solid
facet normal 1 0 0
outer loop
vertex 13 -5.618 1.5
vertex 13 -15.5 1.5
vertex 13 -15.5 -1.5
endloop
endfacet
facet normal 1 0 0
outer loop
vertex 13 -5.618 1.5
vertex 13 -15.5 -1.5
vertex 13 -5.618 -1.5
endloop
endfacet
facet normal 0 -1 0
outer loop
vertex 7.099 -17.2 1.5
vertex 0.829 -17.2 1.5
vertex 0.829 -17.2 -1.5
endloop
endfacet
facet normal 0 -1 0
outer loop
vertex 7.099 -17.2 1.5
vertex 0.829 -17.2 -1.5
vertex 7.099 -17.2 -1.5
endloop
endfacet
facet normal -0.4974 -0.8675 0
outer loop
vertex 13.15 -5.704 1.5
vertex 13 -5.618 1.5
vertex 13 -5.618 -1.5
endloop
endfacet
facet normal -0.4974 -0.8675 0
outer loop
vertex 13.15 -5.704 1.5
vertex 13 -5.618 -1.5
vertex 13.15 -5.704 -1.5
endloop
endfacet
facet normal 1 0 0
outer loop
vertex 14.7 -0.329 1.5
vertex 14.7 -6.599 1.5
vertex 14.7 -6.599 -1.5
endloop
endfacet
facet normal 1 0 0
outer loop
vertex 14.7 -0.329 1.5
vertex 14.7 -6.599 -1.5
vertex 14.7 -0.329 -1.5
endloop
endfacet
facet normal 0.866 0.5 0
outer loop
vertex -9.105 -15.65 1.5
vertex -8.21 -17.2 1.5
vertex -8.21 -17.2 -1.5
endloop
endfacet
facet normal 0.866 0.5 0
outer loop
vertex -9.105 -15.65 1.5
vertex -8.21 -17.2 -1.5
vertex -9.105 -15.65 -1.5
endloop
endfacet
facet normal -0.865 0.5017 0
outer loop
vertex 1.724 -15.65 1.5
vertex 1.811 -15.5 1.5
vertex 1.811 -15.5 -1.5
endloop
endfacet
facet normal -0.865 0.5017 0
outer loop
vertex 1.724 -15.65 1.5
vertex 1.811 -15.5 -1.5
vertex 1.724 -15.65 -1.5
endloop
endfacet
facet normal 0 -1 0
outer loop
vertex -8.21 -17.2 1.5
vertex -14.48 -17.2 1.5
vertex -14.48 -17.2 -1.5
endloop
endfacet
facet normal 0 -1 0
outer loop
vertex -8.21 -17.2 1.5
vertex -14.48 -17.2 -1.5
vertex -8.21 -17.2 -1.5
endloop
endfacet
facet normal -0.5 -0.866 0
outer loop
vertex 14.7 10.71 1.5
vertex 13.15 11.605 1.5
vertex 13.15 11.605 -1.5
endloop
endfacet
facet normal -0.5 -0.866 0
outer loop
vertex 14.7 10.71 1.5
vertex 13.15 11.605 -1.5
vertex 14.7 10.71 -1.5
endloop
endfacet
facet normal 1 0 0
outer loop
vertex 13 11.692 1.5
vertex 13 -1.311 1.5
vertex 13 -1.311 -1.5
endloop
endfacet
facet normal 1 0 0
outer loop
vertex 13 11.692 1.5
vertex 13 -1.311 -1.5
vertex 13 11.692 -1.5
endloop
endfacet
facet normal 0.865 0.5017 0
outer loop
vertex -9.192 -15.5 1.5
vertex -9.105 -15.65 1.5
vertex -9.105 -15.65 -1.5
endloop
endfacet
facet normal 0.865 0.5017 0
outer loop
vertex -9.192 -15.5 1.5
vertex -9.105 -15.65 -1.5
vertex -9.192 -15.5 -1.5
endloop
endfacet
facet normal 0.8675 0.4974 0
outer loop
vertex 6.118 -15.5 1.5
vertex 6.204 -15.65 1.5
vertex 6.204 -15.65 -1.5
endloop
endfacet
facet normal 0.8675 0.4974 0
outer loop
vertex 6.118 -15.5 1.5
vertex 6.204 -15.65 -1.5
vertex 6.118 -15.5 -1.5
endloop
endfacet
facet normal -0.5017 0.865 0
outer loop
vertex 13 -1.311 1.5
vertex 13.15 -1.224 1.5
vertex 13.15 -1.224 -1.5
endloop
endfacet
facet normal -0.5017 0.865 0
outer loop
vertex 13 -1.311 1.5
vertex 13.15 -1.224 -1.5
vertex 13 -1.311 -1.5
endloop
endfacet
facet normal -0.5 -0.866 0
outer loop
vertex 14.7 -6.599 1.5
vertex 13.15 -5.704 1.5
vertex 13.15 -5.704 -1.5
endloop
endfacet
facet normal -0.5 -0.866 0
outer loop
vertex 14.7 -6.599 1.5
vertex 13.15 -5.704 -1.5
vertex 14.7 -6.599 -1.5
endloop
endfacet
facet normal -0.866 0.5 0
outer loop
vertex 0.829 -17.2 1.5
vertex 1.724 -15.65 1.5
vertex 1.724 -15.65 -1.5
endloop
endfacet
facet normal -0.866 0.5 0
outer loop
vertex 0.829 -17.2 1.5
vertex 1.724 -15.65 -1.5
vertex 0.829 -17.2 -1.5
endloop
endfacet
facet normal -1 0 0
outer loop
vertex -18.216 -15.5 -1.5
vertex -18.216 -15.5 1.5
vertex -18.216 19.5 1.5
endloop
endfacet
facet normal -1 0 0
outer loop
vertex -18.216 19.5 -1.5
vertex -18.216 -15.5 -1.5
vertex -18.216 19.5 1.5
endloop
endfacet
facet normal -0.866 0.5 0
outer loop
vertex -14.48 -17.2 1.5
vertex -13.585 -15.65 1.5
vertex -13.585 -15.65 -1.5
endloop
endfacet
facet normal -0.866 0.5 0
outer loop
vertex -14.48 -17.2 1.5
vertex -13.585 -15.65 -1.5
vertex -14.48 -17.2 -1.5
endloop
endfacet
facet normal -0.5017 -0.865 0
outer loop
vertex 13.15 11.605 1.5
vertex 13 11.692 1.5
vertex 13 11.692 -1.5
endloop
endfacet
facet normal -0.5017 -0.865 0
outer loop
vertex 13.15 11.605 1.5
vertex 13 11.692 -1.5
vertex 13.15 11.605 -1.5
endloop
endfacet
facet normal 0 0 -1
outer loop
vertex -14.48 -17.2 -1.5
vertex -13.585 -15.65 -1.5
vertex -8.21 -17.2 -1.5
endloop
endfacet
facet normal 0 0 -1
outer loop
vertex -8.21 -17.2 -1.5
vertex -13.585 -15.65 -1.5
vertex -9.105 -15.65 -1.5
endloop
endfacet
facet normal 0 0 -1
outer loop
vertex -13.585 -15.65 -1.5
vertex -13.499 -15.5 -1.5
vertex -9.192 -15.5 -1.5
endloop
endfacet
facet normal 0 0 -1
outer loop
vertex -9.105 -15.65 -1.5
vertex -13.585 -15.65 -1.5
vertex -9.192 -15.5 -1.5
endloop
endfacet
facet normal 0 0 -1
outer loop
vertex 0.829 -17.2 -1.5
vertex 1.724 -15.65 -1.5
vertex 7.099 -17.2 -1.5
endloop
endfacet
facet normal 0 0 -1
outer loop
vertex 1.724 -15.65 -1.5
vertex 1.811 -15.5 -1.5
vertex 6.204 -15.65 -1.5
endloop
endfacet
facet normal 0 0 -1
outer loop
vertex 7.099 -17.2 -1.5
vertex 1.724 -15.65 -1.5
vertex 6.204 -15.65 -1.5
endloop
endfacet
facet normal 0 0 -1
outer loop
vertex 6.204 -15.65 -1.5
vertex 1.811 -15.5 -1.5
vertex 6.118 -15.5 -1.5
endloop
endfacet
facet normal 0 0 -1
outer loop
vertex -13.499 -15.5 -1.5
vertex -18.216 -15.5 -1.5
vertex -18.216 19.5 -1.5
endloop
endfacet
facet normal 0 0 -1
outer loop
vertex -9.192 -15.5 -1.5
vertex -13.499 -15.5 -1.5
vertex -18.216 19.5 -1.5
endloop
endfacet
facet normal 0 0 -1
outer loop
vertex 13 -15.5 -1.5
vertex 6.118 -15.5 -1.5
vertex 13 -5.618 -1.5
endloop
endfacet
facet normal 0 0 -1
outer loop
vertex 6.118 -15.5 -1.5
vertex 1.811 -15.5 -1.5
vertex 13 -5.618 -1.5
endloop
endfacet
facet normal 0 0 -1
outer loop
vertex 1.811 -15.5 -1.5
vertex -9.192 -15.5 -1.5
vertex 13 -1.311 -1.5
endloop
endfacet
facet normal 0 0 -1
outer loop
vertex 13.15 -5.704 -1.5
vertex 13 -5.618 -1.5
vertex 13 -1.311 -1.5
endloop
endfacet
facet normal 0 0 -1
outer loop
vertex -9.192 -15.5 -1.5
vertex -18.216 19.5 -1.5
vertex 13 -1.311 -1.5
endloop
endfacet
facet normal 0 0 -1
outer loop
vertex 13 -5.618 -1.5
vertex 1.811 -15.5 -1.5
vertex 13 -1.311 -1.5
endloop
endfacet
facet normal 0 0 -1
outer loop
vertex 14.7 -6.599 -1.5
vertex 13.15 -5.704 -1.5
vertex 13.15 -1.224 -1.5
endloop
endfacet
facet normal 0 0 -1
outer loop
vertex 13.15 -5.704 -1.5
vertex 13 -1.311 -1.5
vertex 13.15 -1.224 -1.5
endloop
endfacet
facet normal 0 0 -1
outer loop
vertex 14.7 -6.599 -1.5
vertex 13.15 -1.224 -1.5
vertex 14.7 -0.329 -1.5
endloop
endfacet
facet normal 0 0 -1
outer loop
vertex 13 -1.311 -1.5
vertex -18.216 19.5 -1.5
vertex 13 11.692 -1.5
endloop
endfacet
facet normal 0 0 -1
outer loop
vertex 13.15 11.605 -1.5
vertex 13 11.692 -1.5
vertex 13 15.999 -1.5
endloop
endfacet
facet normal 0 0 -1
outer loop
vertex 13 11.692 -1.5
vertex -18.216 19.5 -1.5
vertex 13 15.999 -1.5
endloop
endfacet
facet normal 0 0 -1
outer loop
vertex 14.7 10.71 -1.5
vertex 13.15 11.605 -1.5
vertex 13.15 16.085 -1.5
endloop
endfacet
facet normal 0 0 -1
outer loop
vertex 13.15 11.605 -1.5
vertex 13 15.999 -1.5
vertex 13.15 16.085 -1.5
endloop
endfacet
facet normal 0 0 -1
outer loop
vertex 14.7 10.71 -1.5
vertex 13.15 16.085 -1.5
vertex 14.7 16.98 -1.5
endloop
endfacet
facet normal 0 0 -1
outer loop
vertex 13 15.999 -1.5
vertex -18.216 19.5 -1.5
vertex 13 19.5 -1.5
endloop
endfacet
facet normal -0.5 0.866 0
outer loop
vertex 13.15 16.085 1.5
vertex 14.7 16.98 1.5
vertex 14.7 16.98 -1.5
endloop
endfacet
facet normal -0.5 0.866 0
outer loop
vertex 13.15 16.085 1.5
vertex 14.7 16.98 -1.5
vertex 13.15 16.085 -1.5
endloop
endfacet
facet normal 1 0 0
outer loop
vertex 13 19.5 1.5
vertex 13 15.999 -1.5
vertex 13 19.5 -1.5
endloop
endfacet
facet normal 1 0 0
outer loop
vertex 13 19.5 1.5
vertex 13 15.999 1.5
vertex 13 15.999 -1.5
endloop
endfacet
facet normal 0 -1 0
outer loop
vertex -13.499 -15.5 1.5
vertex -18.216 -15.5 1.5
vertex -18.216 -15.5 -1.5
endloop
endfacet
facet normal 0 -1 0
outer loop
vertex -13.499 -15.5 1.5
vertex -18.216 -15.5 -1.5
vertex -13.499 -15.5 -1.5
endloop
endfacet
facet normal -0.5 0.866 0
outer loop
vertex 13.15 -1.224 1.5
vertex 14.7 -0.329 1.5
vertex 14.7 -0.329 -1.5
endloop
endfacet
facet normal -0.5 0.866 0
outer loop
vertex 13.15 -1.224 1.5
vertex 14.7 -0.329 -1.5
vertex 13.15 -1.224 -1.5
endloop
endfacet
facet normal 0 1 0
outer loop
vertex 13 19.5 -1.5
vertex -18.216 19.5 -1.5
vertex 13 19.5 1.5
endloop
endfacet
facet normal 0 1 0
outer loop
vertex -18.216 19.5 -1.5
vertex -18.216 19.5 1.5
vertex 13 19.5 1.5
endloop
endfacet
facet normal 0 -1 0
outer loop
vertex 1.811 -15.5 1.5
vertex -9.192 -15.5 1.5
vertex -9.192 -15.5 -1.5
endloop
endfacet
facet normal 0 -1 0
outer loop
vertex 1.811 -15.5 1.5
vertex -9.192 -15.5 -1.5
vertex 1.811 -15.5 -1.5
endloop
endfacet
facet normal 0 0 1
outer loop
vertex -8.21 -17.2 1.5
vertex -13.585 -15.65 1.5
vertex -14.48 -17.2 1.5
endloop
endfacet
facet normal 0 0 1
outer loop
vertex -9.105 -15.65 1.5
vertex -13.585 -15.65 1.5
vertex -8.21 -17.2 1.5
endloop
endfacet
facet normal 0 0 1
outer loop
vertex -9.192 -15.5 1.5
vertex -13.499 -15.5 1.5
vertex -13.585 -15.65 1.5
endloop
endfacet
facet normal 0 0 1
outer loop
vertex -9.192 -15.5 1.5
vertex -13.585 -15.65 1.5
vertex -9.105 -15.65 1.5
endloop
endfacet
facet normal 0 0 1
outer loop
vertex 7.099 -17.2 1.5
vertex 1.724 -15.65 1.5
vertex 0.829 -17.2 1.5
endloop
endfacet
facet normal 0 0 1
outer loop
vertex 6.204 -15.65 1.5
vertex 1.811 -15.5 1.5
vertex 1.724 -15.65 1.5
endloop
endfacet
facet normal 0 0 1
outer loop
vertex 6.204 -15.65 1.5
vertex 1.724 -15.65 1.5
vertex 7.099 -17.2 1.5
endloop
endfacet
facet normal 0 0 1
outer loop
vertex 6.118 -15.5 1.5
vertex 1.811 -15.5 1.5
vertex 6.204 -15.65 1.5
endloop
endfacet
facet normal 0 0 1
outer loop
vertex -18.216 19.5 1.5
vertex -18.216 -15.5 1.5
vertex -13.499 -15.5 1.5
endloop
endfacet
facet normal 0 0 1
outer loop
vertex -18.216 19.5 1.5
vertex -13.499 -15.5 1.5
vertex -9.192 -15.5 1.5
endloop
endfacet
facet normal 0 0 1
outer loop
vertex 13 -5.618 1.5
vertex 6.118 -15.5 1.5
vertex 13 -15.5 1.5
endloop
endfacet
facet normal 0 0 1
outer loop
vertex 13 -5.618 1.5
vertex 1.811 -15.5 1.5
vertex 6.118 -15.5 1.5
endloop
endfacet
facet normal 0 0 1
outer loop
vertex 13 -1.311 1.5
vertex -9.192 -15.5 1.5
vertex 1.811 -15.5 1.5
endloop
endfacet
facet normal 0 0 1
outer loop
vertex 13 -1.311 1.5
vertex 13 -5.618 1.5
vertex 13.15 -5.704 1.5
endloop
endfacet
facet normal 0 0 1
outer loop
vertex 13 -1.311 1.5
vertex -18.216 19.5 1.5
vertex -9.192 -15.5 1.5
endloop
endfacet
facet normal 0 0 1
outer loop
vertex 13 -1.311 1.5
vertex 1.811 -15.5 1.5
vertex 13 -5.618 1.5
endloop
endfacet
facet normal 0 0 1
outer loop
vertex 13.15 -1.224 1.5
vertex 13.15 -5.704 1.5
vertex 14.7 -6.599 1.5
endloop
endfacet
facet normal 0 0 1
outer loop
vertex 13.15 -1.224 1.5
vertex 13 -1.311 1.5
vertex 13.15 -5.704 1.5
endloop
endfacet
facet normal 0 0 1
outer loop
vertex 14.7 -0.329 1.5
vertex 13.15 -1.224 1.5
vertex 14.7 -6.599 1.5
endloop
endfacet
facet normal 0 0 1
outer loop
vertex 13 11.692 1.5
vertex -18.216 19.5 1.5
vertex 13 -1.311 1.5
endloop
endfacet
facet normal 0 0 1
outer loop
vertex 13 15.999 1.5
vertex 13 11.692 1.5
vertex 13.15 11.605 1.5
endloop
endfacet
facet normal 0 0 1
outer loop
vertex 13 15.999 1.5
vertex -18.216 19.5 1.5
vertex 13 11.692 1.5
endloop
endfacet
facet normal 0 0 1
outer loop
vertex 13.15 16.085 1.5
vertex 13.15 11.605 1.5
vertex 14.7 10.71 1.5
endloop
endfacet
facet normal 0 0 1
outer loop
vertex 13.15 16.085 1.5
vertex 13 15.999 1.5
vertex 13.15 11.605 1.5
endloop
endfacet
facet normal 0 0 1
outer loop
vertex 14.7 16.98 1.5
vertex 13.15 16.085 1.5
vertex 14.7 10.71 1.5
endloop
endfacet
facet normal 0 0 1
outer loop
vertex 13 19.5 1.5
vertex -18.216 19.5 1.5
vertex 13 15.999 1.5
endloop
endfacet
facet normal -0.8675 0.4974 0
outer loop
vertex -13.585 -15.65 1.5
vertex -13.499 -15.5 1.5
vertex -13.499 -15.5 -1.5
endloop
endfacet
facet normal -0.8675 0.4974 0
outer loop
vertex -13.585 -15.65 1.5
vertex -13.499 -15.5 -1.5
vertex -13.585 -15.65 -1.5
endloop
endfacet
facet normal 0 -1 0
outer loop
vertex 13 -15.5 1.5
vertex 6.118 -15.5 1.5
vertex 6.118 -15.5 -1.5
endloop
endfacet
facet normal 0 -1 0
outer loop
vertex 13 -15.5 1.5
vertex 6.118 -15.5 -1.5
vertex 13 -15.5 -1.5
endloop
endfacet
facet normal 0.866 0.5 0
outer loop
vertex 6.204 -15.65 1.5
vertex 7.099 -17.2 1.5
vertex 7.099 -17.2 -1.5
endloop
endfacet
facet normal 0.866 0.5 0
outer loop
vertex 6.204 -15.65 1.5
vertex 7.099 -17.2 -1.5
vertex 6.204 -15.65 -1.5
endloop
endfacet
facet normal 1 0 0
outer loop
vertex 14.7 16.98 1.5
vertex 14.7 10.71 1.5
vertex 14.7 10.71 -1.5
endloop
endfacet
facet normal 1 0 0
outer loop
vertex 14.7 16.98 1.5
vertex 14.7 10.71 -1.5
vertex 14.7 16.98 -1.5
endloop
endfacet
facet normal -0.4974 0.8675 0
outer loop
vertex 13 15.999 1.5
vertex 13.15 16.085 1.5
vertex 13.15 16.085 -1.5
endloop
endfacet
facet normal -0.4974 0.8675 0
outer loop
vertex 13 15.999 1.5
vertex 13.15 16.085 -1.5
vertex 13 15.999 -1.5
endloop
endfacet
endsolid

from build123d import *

# Parameters (mm, degrees)
CROQUIS3_W              = 31.215869756
CROQUIS3_H              = 35
SALIENTE_EXTRUIR3_DEPTH = 1.5


with BuildPart() as part:
    # Croquis3 → Saliente-Extruir3 (new, symmetric)
    with BuildSketch(Plane.XY):
        with Locations((-2.607934878, 2)):
            Rectangle(CROQUIS3_W, CROQUIS3_H)
        Polygon((-13.4988893, -15.5), (-13.58549184, -15.65), (-14.480384758, -17.2), (-8.210214166, -17.2), (-9.105107083, -15.65), (-9.191709623, -15.5), align=None)
        Polygon((6.117691454, -15.5), (1.810511777, -15.5), (1.723909236, -15.65), (0.829016319, -17.2), (7.099186911, -17.2), (6.204293994, -15.65), align=None)
        Polygon((13.15, 16.08549184), (13, 15.9988893), (13, 11.691709623), (13.15, 11.605107083), (14.7, 10.710214166), (14.7, 16.980384758), align=None)
        Polygon((13, -1.310511777), (13, -5.617691454), (13.15, -5.704293994), (14.7, -6.599186911), (14.7, -0.329016319), (13.15, -1.223909236), align=None)
    extrude(amount=SALIENTE_EXTRUIR3_DEPTH, both=True)


solid = part.part
